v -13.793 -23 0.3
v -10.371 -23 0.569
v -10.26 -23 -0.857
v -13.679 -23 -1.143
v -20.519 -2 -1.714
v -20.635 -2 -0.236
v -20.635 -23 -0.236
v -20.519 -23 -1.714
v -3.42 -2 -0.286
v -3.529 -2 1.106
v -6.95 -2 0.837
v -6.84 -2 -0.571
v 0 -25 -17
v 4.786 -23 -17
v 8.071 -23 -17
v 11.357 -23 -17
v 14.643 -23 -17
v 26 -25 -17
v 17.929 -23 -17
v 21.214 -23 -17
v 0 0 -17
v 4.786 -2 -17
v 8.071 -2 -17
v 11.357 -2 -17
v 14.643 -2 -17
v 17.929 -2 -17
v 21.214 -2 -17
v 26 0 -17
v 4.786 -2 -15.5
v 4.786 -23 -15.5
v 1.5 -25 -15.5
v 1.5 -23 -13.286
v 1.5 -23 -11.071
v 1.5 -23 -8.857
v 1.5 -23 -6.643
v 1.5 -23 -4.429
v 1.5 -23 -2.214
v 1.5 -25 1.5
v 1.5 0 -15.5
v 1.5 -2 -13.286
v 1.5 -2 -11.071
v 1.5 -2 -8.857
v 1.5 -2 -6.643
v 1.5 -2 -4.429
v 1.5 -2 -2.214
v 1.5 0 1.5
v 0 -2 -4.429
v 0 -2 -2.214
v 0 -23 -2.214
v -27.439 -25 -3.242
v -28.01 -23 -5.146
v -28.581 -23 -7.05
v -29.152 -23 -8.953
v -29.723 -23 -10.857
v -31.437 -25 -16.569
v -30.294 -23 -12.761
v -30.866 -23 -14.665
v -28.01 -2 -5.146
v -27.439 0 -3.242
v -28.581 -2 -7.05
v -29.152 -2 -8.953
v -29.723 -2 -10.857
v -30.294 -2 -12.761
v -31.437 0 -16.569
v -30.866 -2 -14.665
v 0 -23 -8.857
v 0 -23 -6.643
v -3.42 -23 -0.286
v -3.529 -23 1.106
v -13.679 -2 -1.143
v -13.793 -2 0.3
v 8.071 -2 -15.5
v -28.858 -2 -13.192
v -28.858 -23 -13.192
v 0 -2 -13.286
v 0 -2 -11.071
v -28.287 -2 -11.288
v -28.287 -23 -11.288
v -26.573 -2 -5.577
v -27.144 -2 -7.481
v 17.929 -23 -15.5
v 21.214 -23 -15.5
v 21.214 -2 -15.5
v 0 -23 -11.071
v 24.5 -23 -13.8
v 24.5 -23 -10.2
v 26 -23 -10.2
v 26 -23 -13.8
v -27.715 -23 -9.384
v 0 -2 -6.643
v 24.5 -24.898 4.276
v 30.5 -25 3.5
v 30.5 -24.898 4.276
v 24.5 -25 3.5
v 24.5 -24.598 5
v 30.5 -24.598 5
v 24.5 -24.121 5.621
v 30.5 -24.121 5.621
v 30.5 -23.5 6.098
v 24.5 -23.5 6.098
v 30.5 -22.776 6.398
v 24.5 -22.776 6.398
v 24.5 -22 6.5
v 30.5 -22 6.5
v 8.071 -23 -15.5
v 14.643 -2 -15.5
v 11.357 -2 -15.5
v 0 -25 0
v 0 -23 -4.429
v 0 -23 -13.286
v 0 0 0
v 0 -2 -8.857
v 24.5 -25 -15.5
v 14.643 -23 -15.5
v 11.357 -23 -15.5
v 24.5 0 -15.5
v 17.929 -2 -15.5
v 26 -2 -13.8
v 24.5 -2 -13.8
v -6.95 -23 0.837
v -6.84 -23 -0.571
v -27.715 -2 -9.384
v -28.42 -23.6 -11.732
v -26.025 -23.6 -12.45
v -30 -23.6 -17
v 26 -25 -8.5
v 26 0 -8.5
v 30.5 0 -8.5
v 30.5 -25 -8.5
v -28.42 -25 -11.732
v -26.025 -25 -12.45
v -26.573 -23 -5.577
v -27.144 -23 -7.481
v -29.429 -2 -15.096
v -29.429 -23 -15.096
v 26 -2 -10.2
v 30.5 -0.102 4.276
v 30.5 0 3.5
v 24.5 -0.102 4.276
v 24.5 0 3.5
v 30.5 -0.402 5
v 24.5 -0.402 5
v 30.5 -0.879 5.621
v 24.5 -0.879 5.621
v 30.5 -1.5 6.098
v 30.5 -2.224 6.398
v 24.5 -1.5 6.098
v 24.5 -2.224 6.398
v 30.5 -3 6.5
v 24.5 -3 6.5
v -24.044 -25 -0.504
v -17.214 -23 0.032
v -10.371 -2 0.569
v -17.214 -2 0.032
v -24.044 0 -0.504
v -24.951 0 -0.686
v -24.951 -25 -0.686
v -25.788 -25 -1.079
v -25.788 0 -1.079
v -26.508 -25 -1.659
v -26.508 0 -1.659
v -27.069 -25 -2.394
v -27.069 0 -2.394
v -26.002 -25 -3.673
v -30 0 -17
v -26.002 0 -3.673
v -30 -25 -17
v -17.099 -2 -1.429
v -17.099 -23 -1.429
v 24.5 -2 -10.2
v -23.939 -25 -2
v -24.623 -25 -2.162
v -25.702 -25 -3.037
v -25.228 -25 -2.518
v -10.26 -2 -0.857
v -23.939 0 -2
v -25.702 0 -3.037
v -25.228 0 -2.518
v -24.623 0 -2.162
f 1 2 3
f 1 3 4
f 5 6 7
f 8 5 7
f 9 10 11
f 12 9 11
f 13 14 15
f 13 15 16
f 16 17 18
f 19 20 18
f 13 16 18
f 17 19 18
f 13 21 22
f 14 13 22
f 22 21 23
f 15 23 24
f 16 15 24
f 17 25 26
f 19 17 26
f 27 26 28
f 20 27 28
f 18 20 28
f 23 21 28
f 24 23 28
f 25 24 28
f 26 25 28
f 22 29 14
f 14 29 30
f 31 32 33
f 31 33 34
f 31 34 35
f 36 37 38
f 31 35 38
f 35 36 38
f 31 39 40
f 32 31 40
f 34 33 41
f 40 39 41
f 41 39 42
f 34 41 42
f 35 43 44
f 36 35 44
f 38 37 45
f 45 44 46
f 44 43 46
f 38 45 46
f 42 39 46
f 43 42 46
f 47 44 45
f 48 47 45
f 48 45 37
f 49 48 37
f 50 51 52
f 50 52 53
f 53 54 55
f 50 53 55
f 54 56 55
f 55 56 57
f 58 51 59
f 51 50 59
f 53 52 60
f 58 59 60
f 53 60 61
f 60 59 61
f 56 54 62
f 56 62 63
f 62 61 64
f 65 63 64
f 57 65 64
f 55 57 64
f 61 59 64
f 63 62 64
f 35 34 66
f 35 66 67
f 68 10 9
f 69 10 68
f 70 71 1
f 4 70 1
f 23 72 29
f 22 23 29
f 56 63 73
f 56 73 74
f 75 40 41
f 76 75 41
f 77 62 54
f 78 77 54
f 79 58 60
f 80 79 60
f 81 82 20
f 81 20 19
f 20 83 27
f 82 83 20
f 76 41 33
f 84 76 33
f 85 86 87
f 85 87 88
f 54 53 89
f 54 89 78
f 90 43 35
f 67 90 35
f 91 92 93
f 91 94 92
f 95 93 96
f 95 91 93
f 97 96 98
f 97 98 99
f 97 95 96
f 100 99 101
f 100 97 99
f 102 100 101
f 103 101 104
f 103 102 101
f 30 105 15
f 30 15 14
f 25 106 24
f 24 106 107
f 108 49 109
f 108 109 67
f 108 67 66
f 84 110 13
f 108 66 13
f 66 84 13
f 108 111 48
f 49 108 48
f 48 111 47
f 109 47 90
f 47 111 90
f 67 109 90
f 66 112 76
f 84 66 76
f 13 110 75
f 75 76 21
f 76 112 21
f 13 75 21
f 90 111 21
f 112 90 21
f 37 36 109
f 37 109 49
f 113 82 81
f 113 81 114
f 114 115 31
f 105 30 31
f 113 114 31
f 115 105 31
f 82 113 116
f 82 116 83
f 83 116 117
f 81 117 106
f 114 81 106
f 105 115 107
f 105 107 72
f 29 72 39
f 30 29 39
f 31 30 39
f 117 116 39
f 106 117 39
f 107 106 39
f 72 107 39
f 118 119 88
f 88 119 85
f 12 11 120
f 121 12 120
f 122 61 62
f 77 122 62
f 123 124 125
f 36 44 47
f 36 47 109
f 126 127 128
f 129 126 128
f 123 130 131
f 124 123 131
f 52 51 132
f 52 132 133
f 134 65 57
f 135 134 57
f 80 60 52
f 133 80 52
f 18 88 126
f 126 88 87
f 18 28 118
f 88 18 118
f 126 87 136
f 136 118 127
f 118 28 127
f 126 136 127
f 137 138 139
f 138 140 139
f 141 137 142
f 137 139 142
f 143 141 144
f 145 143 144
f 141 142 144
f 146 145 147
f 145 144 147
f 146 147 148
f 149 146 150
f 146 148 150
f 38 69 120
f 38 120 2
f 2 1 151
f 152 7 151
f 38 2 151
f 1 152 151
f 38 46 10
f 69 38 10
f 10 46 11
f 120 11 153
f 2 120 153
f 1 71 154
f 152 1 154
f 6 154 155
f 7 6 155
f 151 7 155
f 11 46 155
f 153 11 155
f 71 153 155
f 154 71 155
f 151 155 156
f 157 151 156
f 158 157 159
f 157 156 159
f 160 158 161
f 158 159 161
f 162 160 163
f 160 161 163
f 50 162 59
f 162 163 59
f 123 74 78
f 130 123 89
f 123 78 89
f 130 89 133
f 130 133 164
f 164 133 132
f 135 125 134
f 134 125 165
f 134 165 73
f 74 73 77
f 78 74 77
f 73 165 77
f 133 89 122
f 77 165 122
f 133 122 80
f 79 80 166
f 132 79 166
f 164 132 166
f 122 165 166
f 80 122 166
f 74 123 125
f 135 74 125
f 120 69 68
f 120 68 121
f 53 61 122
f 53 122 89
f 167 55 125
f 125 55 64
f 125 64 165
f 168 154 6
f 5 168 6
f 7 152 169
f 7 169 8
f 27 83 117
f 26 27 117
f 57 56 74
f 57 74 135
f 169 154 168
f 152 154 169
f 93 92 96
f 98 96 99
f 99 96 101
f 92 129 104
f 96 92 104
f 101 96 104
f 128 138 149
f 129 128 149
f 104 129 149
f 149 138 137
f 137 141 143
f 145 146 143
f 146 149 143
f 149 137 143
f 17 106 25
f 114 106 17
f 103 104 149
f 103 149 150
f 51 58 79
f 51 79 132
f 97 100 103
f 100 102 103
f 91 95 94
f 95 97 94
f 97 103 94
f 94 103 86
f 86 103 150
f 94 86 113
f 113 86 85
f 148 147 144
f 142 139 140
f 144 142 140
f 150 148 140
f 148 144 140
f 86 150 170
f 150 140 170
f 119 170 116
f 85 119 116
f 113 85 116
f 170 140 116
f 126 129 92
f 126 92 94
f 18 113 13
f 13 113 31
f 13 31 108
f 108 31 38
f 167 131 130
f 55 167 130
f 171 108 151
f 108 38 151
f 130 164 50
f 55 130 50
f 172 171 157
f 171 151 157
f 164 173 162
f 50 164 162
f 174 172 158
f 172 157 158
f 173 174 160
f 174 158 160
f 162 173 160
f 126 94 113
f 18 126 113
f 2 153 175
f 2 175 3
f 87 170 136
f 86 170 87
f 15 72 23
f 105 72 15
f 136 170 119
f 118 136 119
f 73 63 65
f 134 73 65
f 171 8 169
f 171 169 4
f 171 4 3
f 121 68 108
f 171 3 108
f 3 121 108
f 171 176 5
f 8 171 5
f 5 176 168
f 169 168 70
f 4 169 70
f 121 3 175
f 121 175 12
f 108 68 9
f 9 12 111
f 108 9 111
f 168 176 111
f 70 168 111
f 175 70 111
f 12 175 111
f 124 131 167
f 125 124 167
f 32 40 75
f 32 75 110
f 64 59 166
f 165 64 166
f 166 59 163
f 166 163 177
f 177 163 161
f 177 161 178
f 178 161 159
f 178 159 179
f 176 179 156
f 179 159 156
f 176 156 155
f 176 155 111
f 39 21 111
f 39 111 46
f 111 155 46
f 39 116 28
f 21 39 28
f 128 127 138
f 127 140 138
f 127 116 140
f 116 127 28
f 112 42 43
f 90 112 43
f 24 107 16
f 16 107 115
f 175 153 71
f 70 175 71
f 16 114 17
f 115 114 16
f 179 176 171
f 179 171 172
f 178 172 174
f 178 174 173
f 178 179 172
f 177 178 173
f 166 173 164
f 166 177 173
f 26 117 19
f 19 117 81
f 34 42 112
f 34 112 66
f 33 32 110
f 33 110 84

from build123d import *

# Parameters (mm, degrees)
PAD_DEPTH       = 25
SKETCH001_W     = 3.2857142857
SKETCH001_H     = 21
POCKET_DEPTH    = 1.501
SKETCH002_W     = 2.2142857143
SKETCH002_H     = 21
POCKET001_DEPTH = 1.5
SKETCH003_W     = 3.4317132954
SKETCH003_H     = 21
POCKET002_DEPTH = 20.7120716736
SKETCH004_W     = 1.9877118903
SKETCH004_H     = 21
POCKET003_DEPTH = 1.5
FILLET_R        = 3
PAD001_DEPTH    = 1.4
SKETCH006_W     = 3.6
SKETCH006_H     = 21
POCKET004_DEPTH = 6.001


with BuildPart() as part:
    # Sketch → Pad (new body)
    with BuildSketch(Plane.XZ):
        with BuildLine():
            Line((0, 0), (0, -17))
            Line((0, -17), (26, -17))
            Line((26, -17), (26, -8.5))
            Line((26, -8.5), (30.5, -8.5))
            Line((30.5, -8.5), (30.5, 6.5))
            Line((30.5, 6.5), (24.5, 6.5))
            Line((24.5, 6.5), (24.5, -15.5))
            Line((24.5, -15.5), (1.5, -15.5))
            Line((1.5, -15.5), (1.5, 1.5))
            Line((1.5, 1.5), (-24.044265063, -0.50362671))
            ThreePointArc((-24.044265063, -0.50362671), (-26.165331878, -1.347225864), (-27.4385857662, -3.2417992996))
            Line((-27.4385857662, -3.2417992996), (-31.4367394278, -16.5689781716))
            Line((-31.4367394278, -16.5689781716), (-30, -17))
            Line((-30, -17), (-26.0018463384, -3.6728211279))
            ThreePointArc((-23.9389017142, -2), (-25.2281870129, -2.5184722585), (-26.0018463384, -3.6728211279))
            Line((-23.9389017142, -2), (0, 0))
        make_face()
    extrude(amount=PAD_DEPTH)

    # Sketch001 → Pocket (cut, through all)
    with BuildSketch(Plane(origin=(0, 0, -15.5), x_dir=(-1, 0, 0), z_dir=(0, 0, 1))):
        with Locations((-6.4285714286, 12.5)):
            Rectangle(SKETCH001_W, SKETCH001_H)
        with Locations((-13, 12.5)):
            Rectangle(SKETCH001_W, SKETCH001_H)
        with Locations((-19.5714285714, 12.5)):
            Rectangle(SKETCH001_W, SKETCH001_H)
    extrude(amount=-POCKET_DEPTH, mode=Mode.SUBTRACT)

    # Sketch002 → Pocket001 (cut)
    with BuildSketch(Plane(origin=(1.5, 0, 0), x_dir=(0, 0, 1), z_dir=(1, 0, 0))):
        with Locations((-3.3214285714, 12.5)):
            Rectangle(SKETCH002_W, SKETCH002_H)
        with Locations((-7.75, 12.5)):
            Rectangle(SKETCH002_W, SKETCH002_H)
        with Locations((-12.1785714286, 12.5)):
            Rectangle(SKETCH002_W, SKETCH002_H)
    extrude(amount=-POCKET001_DEPTH, mode=Mode.SUBTRACT)

    # Sketch003 → Pocket002 (cut, through all)
    with BuildSketch(Plane(origin=(-0.1077644959, 0, 1.3738910718), x_dir=(-0.9969379064, 0, -0.0781972553), z_dir=(-0.0781972553, 0, 0.9969379064))):
        with Locations((18.8744231246, 12.5)):
            Rectangle(SKETCH003_W, SKETCH003_H)
        with Locations((12.0109965338, 12.5)):
            Rectangle(SKETCH003_W, SKETCH003_H)
        with Locations((5.1475699431, 12.5)):
            Rectangle(SKETCH003_W, SKETCH003_H)
    extrude(amount=-POCKET002_DEPTH, mode=Mode.SUBTRACT)

    # Sketch004 → Pocket003 (cut)
    with BuildSketch(Plane(origin=(-24.2807761251, 0, 7.2842328375), x_dir=(-0.2873478856, 0, -0.9578262852), z_dir=(-0.9578262852, 0, 0.2873478856))):
        with Locations((21.9219155803, 12.5)):
            Rectangle(SKETCH004_W, SKETCH004_H)
        with Locations((17.9464917996, 12.5)):
            Rectangle(SKETCH004_W, SKETCH004_H)
        with Locations((13.9710680189, 12.5)):
            Rectangle(SKETCH004_W, SKETCH004_H)
    extrude(amount=-POCKET003_DEPTH, mode=Mode.SUBTRACT)

    # Fillet
    fillet_edges = [part.edges().sort_by_distance(p)[0] for p in [
        (27.5, -25, 6.5),
        (27.5, 0, 6.5),
    ]]
    fillet(fillet_edges, radius=FILLET_R)

    # Sketch005 → Pad001 (new body)
    with BuildSketch(Plane.XZ.offset(25)):
        Polygon((-28.4195866294, -11.7319554313), (-26.0250209163, -12.4503251452), (-30, -17), align=None)
    extrude(amount=-PAD001_DEPTH)

    # Sketch006 → Pocket004 (cut, through all)
    with BuildSketch(Plane(origin=(24.5, 0, 0), x_dir=(0, 0, -1), z_dir=(-1, 0, 0))):
        with Locations((12, 12.5)):
            Rectangle(SKETCH006_W, SKETCH006_H)
    extrude(amount=-POCKET004_DEPTH, mode=Mode.SUBTRACT)


solid = part.part
